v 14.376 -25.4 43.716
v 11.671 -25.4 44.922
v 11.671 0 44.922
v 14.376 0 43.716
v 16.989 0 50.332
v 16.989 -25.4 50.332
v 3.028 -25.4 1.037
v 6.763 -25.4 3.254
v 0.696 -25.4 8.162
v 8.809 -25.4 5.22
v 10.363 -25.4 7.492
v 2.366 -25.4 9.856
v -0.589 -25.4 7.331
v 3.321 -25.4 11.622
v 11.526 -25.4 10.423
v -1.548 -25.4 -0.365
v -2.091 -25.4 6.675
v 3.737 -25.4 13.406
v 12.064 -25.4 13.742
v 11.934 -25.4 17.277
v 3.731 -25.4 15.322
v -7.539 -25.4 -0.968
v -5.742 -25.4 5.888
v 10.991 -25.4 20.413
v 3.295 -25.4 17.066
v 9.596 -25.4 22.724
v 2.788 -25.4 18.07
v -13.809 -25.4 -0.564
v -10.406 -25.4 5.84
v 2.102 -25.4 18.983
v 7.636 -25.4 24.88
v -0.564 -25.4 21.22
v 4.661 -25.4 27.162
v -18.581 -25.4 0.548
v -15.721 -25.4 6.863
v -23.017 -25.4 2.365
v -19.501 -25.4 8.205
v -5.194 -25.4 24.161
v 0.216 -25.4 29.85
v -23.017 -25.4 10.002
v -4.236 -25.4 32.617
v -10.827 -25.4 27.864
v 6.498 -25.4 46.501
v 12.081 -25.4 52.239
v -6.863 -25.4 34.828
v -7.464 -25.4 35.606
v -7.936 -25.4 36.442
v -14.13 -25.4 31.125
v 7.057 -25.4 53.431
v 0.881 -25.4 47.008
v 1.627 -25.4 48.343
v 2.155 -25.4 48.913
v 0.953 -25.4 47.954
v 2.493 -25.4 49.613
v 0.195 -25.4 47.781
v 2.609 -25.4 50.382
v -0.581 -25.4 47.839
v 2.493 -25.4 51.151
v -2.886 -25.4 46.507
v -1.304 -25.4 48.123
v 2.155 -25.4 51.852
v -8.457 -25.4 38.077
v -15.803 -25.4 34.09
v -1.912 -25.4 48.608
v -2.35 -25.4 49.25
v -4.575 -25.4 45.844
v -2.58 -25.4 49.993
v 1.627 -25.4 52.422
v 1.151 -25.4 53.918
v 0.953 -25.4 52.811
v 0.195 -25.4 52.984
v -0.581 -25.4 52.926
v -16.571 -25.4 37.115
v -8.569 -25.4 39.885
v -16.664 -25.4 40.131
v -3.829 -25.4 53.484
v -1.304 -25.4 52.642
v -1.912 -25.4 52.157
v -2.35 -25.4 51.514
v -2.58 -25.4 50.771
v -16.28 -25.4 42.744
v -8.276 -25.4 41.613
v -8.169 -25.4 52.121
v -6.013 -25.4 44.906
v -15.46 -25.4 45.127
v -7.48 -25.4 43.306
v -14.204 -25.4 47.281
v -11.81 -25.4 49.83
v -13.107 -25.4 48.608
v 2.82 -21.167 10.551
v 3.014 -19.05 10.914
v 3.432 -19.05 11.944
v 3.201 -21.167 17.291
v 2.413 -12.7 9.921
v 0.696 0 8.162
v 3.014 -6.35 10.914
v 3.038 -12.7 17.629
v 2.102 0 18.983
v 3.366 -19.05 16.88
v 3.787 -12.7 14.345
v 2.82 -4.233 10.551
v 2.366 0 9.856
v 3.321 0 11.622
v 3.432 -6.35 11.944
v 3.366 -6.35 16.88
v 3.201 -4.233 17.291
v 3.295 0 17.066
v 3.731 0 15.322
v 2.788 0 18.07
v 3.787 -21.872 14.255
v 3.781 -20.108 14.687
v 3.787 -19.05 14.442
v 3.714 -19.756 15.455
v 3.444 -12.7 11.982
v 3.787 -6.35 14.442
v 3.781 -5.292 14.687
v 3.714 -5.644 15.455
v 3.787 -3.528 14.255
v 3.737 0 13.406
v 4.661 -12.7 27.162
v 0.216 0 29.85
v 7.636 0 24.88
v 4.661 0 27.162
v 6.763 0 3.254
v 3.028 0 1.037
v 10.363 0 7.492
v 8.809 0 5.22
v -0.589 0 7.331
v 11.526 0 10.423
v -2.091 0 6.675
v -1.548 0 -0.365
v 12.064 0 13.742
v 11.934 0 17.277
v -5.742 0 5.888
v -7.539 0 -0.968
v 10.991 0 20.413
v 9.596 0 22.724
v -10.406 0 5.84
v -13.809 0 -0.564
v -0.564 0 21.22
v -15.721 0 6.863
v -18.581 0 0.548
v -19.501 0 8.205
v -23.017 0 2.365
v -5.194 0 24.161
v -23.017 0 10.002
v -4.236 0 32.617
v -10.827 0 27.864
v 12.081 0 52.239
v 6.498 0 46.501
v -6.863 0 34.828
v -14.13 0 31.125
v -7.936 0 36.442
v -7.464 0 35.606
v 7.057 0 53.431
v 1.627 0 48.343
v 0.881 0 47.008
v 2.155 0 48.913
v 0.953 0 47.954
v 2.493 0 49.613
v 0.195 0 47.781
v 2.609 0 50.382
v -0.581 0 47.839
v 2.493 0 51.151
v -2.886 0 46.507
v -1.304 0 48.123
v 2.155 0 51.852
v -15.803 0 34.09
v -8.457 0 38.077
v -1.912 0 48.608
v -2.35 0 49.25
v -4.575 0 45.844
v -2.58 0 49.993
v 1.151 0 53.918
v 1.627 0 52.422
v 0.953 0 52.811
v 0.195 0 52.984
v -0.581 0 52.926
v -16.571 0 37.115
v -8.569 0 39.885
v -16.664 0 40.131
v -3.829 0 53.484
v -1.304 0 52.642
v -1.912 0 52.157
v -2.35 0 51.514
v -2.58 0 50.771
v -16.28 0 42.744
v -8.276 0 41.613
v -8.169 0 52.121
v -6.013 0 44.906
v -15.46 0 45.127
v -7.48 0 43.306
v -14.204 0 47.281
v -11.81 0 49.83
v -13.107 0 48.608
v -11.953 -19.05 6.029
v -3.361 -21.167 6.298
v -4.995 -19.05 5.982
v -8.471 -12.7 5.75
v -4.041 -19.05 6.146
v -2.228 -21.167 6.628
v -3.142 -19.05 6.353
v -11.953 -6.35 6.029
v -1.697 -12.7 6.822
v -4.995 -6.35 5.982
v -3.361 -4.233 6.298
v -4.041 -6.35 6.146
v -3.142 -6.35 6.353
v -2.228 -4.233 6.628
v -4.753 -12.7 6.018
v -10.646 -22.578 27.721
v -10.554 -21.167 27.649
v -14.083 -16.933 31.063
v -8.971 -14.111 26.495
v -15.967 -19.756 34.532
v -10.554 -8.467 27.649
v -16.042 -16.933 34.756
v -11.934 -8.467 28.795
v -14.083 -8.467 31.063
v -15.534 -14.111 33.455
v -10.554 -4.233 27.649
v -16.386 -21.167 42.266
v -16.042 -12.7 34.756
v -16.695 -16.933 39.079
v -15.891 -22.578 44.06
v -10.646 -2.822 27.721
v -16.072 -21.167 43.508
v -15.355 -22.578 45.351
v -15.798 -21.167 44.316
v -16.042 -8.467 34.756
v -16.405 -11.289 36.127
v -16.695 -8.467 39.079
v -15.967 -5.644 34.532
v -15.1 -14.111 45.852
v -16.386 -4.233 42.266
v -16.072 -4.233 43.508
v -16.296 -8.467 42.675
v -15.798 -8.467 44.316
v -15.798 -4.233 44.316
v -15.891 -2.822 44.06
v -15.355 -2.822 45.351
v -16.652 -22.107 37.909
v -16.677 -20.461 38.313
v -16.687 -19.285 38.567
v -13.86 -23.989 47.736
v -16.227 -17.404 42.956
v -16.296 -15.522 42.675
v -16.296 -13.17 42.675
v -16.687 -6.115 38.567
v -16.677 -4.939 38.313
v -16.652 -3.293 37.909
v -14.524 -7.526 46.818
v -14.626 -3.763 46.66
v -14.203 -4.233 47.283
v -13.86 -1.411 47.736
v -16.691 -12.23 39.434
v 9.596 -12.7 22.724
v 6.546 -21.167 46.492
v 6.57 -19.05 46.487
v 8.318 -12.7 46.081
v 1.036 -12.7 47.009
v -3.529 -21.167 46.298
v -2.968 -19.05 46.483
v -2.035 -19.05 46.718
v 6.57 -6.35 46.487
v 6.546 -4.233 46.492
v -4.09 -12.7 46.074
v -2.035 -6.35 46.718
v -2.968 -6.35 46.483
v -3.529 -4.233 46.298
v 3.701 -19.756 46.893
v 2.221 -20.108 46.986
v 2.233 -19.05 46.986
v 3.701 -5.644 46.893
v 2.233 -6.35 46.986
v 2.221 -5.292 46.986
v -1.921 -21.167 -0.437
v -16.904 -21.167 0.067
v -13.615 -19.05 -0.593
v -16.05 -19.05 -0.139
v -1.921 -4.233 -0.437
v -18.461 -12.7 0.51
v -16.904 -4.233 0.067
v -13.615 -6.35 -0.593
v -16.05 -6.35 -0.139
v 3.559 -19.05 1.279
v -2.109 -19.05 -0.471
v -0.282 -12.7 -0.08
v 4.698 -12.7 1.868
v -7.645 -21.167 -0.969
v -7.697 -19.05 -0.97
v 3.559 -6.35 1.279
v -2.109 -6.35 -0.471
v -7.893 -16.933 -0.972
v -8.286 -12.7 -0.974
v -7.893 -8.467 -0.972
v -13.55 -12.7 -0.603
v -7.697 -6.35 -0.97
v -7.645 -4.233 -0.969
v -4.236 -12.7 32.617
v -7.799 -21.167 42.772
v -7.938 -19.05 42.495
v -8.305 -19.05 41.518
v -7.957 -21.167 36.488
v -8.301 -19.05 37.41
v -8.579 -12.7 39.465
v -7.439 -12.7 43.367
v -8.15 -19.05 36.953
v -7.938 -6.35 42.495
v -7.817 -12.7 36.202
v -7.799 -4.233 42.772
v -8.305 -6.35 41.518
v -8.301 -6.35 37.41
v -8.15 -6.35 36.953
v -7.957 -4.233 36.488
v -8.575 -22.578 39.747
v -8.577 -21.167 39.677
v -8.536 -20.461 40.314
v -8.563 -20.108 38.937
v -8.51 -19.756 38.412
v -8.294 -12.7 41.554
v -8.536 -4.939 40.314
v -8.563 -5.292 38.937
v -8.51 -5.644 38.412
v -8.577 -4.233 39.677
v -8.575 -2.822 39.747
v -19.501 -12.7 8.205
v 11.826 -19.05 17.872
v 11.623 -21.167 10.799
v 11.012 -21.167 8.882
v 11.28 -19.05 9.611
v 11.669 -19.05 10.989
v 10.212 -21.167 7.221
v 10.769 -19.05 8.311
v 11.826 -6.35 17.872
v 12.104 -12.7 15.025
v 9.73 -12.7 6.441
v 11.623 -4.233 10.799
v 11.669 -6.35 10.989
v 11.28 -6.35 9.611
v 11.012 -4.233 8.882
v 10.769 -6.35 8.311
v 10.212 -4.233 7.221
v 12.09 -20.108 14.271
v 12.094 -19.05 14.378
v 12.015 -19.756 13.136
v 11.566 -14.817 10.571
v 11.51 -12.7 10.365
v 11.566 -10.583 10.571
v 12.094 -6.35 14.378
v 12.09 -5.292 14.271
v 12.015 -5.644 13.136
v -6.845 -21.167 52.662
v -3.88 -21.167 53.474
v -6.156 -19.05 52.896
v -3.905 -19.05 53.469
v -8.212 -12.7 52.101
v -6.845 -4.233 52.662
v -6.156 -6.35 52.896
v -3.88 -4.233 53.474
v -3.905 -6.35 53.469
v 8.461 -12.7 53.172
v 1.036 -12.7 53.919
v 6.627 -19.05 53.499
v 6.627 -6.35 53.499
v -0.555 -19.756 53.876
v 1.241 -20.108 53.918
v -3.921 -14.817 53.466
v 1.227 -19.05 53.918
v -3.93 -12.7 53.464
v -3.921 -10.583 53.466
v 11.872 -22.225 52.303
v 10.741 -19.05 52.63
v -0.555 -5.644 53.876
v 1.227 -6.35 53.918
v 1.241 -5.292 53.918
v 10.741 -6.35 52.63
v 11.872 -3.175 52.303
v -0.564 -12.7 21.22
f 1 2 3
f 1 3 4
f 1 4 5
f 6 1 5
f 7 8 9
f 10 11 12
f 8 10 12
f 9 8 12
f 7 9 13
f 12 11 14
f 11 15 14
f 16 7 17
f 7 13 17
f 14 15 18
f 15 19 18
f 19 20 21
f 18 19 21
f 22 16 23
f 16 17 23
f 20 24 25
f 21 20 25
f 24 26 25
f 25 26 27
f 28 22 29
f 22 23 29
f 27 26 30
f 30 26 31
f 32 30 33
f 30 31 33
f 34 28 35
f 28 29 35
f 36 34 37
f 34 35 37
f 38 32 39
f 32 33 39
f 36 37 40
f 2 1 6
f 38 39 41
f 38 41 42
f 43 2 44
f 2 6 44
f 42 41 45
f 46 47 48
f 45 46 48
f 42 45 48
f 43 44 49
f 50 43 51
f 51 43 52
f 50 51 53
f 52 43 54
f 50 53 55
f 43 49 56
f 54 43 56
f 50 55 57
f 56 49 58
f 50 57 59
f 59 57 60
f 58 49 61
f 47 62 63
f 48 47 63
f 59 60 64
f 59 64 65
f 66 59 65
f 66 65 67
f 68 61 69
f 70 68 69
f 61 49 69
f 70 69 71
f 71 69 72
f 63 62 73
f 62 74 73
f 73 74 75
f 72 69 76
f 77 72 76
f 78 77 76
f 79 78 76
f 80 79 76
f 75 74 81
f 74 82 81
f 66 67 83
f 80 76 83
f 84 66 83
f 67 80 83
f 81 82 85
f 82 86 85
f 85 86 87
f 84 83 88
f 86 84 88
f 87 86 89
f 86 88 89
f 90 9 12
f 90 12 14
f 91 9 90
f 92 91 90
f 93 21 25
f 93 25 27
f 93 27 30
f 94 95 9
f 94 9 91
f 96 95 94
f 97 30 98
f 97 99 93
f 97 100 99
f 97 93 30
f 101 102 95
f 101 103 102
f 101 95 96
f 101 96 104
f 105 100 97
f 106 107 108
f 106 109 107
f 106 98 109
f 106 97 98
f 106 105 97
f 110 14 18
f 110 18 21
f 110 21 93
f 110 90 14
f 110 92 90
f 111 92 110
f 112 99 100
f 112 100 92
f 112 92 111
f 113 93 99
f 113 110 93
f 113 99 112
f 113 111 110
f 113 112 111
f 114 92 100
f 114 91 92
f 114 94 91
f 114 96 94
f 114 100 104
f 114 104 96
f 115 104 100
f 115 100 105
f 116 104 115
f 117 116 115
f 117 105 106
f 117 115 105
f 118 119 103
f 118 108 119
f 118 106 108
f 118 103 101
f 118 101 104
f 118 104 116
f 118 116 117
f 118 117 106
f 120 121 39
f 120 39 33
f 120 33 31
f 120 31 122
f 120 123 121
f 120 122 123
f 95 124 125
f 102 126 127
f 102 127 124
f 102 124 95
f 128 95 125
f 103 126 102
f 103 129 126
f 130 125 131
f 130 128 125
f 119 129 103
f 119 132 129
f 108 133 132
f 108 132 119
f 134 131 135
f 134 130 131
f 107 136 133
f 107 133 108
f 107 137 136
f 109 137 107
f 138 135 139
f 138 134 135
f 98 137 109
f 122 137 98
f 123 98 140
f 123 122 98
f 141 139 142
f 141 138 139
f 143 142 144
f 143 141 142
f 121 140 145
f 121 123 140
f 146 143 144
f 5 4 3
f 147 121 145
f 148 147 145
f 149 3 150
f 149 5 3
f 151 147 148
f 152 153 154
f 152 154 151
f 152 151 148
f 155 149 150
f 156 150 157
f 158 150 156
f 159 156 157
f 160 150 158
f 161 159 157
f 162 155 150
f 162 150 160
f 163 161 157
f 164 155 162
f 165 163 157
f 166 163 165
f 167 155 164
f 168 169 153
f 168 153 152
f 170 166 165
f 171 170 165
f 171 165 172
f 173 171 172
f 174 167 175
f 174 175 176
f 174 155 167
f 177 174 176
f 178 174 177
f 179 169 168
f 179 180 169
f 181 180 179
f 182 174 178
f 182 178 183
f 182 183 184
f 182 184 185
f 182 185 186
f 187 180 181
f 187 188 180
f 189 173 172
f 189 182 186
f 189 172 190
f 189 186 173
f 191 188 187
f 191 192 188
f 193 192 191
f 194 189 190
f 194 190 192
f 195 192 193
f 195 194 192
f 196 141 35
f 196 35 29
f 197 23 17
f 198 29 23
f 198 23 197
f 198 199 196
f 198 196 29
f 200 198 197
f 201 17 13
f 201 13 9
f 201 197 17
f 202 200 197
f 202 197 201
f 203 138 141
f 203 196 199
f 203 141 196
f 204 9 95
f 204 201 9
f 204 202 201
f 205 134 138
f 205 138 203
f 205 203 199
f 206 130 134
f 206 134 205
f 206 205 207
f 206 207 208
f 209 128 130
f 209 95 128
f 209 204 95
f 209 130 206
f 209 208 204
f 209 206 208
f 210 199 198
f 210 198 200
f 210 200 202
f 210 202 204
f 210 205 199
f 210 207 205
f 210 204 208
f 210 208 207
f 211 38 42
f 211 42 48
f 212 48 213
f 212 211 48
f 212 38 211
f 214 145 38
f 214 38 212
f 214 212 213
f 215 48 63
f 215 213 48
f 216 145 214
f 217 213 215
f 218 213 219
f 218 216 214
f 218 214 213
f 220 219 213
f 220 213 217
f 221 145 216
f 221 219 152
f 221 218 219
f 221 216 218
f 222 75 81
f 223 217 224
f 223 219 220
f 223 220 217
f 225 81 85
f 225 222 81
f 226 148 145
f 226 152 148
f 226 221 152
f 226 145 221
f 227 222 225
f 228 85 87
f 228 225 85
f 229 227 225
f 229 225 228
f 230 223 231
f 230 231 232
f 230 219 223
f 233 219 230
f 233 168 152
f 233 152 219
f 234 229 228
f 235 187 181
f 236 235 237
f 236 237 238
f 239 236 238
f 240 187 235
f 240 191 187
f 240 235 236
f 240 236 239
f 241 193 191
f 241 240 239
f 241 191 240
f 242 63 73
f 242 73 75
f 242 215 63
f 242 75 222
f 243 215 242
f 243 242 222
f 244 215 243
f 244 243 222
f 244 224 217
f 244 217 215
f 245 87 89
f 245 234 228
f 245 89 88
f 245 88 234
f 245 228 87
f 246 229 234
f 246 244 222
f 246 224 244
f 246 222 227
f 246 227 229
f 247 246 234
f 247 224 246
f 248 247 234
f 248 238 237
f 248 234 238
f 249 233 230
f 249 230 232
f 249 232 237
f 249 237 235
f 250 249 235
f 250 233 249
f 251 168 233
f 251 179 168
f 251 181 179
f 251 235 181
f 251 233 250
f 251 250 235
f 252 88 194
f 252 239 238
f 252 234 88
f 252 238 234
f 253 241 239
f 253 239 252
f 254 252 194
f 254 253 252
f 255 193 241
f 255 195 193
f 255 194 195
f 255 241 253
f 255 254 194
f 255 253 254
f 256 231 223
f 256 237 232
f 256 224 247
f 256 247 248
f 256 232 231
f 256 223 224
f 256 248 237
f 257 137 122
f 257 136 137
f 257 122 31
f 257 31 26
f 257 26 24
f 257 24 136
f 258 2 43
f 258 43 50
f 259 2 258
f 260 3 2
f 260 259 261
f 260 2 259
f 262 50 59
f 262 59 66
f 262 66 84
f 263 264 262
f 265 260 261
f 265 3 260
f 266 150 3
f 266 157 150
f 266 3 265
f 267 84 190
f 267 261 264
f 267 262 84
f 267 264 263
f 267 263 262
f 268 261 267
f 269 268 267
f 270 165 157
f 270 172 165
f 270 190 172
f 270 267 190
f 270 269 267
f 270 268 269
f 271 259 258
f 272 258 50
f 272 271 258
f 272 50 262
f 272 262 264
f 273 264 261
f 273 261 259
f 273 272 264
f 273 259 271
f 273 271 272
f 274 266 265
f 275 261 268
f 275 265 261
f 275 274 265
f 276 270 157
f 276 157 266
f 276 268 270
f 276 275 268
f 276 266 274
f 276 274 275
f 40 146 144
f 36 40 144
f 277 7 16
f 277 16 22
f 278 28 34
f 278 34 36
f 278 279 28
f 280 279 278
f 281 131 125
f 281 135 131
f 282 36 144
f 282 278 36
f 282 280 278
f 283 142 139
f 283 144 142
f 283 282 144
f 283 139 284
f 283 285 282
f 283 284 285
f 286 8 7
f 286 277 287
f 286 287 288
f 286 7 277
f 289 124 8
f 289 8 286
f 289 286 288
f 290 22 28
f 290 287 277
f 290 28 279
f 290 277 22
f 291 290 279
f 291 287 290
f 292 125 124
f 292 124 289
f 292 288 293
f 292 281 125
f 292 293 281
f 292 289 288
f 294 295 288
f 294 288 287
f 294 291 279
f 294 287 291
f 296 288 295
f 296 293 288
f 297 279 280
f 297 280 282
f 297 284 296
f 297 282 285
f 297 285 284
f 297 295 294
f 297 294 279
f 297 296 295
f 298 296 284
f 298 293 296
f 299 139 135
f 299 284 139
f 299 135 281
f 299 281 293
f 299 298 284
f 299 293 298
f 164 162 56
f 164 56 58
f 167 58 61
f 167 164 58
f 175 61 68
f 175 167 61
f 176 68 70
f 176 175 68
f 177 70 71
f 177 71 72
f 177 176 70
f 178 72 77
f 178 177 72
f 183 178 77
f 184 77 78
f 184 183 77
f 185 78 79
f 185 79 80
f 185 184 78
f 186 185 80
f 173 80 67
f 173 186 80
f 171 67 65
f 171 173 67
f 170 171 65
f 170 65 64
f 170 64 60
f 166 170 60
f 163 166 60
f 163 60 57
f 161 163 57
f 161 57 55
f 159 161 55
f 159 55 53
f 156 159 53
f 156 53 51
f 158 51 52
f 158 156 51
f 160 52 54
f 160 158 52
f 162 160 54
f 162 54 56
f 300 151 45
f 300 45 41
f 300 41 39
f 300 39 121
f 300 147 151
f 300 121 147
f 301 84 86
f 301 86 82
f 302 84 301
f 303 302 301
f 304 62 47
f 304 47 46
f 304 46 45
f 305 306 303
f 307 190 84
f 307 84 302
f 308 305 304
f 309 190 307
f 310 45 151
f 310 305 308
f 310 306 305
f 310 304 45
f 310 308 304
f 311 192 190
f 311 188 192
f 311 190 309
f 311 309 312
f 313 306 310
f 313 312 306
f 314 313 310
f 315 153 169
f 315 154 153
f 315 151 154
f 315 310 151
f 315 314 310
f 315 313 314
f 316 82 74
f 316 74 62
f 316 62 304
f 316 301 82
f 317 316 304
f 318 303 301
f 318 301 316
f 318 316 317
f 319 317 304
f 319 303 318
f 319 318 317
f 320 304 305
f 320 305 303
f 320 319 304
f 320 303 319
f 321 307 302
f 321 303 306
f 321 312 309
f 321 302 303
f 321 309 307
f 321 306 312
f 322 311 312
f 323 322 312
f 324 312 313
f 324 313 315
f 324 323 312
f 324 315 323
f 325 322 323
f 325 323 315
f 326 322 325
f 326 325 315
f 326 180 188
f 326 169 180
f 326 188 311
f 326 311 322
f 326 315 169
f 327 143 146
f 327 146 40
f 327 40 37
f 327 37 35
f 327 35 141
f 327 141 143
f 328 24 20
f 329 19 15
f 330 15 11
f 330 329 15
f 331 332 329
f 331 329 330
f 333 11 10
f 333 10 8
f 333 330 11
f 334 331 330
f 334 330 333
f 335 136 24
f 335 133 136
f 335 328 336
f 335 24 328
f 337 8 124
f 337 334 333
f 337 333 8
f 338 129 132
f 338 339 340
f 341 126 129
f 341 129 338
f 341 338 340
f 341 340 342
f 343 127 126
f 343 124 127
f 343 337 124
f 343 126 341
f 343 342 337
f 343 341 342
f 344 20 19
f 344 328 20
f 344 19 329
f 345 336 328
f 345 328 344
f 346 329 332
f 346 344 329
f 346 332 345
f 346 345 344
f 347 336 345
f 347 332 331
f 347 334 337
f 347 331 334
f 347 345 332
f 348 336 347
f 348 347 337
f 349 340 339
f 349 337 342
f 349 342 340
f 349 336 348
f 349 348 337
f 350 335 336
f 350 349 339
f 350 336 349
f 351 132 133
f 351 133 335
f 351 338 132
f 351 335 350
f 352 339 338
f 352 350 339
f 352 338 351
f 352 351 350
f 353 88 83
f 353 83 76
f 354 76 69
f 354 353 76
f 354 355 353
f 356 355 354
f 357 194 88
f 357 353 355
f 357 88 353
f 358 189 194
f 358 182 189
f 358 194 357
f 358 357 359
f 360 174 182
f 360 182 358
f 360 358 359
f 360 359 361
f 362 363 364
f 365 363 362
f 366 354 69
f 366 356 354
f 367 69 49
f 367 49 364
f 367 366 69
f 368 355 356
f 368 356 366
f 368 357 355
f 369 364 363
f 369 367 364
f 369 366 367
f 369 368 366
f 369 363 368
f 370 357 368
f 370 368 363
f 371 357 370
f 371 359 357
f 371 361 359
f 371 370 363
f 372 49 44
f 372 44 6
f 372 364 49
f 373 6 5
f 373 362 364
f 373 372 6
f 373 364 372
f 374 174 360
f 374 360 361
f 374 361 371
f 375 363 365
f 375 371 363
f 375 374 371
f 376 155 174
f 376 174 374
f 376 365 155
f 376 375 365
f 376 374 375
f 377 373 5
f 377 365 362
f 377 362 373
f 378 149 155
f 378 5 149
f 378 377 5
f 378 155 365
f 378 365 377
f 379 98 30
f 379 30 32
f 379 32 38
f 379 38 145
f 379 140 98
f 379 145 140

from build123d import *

# Parameters (mm, degrees)
F0_R     = 2.6087780621
F1_DEPTH = 25.4


with BuildPart() as f1:
    # F0 (on Front) → F1 (new body)
    with BuildSketch(Plane.XZ):
        with BuildLine():
            add(Edge.make_bspline(
                [(12.1038620855, 15.0254839682), (12.1038620855, 7.4818253504), (6.7630136174, 3.2539756948)],
                knots=[0, 0, 0, 1, 1, 1], degree=2))
            add(Edge.make_bspline(
                [(10.990863273, 20.4127073868), (12.1038620855, 18.0243974351), (12.1038620855, 15.0254839682)],
                knots=[0, 0, 0, 1, 1, 1], degree=2))
            add(Edge.make_bspline(
                [(7.6364085188, 24.8801609535), (9.8778644606, 22.8010173386), (10.990863273, 20.4127073868)],
                knots=[0, 0, 0, 1, 1, 1], degree=2))
            add(Edge.make_bspline(
                [(0.2164164358, 29.8500098175), (5.3949525771, 26.9593045685), (7.6364085188, 24.8801609535)],
                knots=[0, 0, 0, 1, 1, 1], degree=2))
            add(Edge.make_bspline(
                [(-6.8634926768, 34.8275878399), (-5.1476195076, 32.8952982349), (0.2164164358, 29.8500098175)],
                knots=[0, 0, 0, 1, 1, 1], degree=2))
            add(Edge.make_bspline(
                [(-8.579365846, 39.4650828918), (-8.579365846, 36.7598774448), (-6.8634926768, 34.8275878399)],
                knots=[0, 0, 0, 1, 1, 1], degree=2))
            add(Edge.make_bspline(
                [(-6.0132852506, 44.9064104194), (-8.579365846, 42.8040793292), (-8.579365846, 39.4650828918)],
                knots=[0, 0, 0, 1, 1, 1], degree=2))
            add(Edge.make_bspline(
                [(1.0357072283, 47.0087415096), (-3.4472046553, 47.0087415096), (-6.0132852506, 44.9064104194)],
                knots=[0, 0, 0, 1, 1, 1], degree=2))
            add(Edge.make_bspline(
                [(11.671029214, 44.9218687362), (6.7862010926, 47.0087415096), (1.0357072283, 47.0087415096)],
                knots=[0, 0, 0, 1, 1, 1], degree=2))
            Line((11.671029214, 44.9218687362), (14.3762346609, 43.7161200227))
            Line((14.3762346609, 43.7161200227), (16.9886902068, 50.3322796301))
            add(Edge.make_bspline(
                [(1.0357072283, 53.9186091369), (9.3059067375, 53.9186091369), (16.9886902068, 50.3322796301)],
                knots=[0, 0, 0, 1, 1, 1], degree=2))
            add(Edge.make_bspline(
                [(-11.8101540655, 49.8298843328), (-6.9253259442, 53.9186091369), (1.0357072283, 53.9186091369)],
                knots=[0, 0, 0, 1, 1, 1], degree=2))
            add(Edge.make_bspline(
                [(-16.6949821869, 39.0786249708), (-16.6949821869, 45.7411595287), (-11.8101540655, 49.8298843328)],
                knots=[0, 0, 0, 1, 1, 1], degree=2))
            add(Edge.make_bspline(
                [(-14.082526641, 31.0634876894), (-16.6949821869, 34.4411299189), (-16.6949821869, 39.0786249708)],
                knots=[0, 0, 0, 1, 1, 1], degree=2))
            add(Edge.make_bspline(
                [(-5.1939944581, 24.1613492205), (-11.4700710951, 27.6858454599), (-14.082526641, 31.0634876894)],
                knots=[0, 0, 0, 1, 1, 1], degree=2))
            add(Edge.make_bspline(
                [(2.1023310902, 18.9828130792), (0.4173745547, 20.8687277336), (-5.1939944581, 24.1613492205)],
                knots=[0, 0, 0, 1, 1, 1], degree=2))
            add(Edge.make_bspline(
                [(3.7872876257, 14.3453180273), (3.7872876257, 17.0968984247), (2.1023310902, 18.9828130792)],
                knots=[0, 0, 0, 1, 1, 1], degree=2))
            add(Edge.make_bspline(
                [(0.6956242578, 8.1619912914), (3.7872876257, 10.5734887184), (3.7872876257, 14.3453180273)],
                knots=[0, 0, 0, 1, 1, 1], degree=2))
            add(Edge.make_bspline(
                [(-8.4711576282, 5.7504938644), (-2.3960391102, 5.7504938644), (0.6956242578, 8.1619912914)],
                knots=[0, 0, 0, 1, 1, 1], degree=2))
            add(Edge.make_bspline(
                [(-15.721108226, 6.8634926768), (-11.8101540655, 5.7504938644), (-8.4711576282, 5.7504938644)],
                knots=[0, 0, 0, 1, 1, 1], degree=2))
            add(Edge.make_bspline(
                [(-23.0174337743, 10.0015309953), (-19.6320623864, 7.9764914893), (-15.721108226, 6.8634926768)],
                knots=[0, 0, 0, 1, 1, 1], degree=2))
            Line((-23.0174337743, 10.0015309953), (-23.0174337743, 2.3651224765))
            add(Edge.make_bspline(
                [(-8.2856578261, -0.9738739609), (-16.4476491175, -0.9738739609), (-23.0174337743, 2.3651224765)],
                knots=[0, 0, 0, 1, 1, 1], degree=2))
            add(Edge.make_bspline(
                [(6.7630136174, 3.2539756948), (1.4221651493, -0.9738739609), (-8.2856578261, -0.9738739609)],
                knots=[0, 0, 0, 1, 1, 1], degree=2))
        make_face()
        with Locations((0, 50.3822378814)):
            Circle(F0_R, mode=Mode.SUBTRACT)
    extrude(amount=F1_DEPTH)


solid = f1.part
